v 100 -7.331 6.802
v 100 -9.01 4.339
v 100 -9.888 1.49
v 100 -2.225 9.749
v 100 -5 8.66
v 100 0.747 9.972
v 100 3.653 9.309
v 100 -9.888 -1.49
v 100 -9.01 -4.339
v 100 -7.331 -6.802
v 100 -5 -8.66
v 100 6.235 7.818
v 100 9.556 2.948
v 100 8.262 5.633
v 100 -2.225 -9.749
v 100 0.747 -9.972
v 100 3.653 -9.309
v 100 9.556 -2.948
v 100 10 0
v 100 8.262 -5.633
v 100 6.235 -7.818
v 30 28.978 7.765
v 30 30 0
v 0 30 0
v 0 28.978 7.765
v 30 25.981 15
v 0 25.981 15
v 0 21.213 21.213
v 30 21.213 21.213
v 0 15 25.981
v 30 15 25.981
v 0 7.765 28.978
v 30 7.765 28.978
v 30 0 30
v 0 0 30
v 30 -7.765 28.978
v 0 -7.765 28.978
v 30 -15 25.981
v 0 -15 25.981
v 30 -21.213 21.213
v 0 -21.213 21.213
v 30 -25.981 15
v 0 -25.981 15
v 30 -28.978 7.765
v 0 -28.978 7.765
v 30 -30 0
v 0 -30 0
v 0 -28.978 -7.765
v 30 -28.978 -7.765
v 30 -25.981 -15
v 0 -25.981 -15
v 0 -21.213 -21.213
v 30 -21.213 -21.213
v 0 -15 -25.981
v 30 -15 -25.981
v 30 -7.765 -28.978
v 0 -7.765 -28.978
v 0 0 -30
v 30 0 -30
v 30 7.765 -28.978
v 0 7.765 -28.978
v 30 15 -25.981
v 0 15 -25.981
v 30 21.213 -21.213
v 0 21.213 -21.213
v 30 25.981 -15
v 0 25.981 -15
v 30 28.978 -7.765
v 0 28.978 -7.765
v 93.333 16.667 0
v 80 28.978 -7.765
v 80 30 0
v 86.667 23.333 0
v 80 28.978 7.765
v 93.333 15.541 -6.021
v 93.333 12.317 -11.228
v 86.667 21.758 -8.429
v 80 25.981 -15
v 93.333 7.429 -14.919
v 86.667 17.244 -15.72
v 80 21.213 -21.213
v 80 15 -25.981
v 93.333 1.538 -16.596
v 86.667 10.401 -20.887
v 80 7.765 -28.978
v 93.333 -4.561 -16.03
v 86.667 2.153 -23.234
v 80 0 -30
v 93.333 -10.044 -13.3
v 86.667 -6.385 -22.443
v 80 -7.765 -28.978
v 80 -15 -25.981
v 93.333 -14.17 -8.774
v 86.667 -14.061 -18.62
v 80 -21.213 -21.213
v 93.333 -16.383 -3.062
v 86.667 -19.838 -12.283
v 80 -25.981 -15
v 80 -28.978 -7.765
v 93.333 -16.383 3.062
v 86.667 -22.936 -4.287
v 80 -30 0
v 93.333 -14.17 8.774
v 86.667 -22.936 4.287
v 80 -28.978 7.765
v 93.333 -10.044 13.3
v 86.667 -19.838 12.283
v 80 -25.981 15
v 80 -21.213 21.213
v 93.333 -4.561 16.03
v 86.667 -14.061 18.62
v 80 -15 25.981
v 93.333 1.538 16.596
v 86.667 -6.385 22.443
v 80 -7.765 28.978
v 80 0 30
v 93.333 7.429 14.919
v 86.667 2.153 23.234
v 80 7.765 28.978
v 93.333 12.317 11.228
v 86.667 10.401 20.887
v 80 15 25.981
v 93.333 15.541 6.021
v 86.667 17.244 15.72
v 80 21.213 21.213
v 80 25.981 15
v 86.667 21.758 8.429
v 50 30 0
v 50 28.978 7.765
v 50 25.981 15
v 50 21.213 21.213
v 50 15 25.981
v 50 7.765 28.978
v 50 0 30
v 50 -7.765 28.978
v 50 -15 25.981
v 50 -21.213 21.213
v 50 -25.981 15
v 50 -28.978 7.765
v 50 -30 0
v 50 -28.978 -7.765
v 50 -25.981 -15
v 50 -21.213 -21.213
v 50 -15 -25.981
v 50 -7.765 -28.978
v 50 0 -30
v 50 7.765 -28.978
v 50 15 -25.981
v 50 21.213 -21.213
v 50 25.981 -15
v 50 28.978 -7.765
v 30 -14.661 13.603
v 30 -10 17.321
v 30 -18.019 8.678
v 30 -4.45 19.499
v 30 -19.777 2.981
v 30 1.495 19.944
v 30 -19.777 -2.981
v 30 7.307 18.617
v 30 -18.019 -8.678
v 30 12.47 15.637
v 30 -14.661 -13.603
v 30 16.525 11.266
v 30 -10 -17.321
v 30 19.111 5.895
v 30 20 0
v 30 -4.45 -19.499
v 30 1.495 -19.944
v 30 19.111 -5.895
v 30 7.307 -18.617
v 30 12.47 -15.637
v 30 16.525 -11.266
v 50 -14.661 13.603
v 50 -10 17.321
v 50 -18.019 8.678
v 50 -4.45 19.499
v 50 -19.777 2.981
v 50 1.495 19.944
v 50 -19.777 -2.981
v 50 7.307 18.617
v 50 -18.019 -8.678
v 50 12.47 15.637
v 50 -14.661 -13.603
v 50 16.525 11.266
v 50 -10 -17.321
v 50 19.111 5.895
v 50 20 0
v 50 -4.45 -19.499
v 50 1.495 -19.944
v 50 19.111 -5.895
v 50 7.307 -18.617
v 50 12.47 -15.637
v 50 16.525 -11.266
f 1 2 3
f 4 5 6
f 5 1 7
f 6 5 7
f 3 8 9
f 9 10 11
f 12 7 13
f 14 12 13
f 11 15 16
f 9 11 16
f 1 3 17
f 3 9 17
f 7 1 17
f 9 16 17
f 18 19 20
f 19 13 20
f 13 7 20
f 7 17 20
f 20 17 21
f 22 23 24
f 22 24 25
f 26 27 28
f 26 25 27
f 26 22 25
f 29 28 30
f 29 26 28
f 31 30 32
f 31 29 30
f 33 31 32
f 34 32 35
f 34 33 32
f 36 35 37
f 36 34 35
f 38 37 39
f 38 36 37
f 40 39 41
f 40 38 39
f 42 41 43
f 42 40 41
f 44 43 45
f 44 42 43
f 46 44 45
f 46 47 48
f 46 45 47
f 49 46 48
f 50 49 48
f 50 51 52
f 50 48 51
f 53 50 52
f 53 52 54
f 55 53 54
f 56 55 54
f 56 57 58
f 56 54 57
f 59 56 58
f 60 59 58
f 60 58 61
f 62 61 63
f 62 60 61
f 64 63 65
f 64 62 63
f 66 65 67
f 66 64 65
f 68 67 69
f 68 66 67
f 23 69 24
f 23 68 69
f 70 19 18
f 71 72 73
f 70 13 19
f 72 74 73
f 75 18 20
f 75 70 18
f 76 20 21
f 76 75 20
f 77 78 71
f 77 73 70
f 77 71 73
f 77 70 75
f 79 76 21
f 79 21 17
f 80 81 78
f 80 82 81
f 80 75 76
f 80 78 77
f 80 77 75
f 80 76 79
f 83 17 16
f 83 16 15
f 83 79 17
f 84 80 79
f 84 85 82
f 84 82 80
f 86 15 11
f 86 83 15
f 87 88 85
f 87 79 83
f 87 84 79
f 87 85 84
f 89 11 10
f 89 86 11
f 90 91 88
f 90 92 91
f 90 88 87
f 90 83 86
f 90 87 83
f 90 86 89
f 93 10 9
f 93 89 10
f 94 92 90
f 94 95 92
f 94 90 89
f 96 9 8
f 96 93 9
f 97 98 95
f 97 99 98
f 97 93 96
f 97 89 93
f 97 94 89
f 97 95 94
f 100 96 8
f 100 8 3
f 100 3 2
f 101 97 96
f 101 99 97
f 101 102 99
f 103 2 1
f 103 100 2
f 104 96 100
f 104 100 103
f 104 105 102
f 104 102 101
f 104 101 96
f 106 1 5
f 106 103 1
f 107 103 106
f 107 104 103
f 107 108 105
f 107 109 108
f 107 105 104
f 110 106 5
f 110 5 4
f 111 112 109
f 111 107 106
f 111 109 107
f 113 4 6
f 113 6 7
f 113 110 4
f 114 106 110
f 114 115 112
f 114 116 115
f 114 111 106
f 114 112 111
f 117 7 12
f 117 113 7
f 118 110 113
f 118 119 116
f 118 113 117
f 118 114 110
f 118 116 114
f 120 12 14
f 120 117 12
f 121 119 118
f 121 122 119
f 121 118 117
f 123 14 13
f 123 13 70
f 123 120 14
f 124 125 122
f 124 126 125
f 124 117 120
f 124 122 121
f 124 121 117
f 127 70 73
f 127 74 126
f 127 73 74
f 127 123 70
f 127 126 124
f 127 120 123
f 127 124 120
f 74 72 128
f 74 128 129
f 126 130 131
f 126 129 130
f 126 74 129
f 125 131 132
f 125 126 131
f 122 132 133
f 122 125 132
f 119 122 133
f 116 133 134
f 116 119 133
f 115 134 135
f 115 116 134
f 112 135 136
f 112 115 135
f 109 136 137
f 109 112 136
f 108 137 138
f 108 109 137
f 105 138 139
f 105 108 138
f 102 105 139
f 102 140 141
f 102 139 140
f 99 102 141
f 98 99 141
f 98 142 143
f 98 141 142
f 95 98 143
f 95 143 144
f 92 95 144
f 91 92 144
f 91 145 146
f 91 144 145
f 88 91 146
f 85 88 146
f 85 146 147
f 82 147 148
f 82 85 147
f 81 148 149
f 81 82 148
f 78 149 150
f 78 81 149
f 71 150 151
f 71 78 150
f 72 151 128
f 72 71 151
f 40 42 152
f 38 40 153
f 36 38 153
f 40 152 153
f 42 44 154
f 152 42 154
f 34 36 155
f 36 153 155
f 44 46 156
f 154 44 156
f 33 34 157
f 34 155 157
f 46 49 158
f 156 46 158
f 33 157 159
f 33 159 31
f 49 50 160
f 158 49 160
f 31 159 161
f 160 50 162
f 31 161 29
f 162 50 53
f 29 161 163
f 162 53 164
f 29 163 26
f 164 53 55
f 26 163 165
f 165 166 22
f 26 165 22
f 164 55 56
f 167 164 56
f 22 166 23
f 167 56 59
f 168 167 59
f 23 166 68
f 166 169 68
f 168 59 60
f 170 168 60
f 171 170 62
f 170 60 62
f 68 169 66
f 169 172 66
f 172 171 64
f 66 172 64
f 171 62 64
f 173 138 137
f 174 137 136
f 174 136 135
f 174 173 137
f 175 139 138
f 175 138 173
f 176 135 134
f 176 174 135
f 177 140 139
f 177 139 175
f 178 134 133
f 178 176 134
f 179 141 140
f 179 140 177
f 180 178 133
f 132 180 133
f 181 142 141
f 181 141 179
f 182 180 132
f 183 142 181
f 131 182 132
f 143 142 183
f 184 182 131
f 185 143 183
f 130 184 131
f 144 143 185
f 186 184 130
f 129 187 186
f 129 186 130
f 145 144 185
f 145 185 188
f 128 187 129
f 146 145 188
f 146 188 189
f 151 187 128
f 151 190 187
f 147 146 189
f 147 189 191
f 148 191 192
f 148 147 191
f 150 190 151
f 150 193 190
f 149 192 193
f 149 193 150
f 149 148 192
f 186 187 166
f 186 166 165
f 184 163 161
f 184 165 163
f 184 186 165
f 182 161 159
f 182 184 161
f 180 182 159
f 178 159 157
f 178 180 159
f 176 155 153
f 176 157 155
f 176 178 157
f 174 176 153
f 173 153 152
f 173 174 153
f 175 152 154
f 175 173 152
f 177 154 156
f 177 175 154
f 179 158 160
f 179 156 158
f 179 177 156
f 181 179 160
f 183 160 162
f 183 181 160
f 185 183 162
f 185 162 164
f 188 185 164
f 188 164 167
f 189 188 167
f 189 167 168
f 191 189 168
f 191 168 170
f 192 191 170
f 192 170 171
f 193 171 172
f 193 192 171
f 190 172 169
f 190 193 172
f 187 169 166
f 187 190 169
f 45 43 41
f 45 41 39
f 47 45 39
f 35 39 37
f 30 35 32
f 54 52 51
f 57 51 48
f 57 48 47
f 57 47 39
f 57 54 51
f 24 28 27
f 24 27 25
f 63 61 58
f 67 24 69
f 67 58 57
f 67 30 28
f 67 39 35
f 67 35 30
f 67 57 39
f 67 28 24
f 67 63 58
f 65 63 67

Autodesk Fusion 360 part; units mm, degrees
sketch "Sketch1" plane through (0, 0, 0) normal (0, 0, 1) x (1, 0, 0)
  line L0 (0, 0) -> (0, 30)
  line L1 (0, 30) -> (30, 30)
  line L2 (30, 30) -> (30, 20)
  line L3 (30, 20) -> (50, 20)
  line L4 (50, 20) -> (50, 30)
  line L5 (50, 30) -> (80, 30)
  line L6 (80, 30) -> (100, 10)
  line L7 (100, 10) -> (100, 0)
  line L8 (100, 0) -> (0, 0)
revolve "Revolve1" add sketch "Sketch1" angle 360 about axis through (100, 0, 0) along (-1, 0, 0)
